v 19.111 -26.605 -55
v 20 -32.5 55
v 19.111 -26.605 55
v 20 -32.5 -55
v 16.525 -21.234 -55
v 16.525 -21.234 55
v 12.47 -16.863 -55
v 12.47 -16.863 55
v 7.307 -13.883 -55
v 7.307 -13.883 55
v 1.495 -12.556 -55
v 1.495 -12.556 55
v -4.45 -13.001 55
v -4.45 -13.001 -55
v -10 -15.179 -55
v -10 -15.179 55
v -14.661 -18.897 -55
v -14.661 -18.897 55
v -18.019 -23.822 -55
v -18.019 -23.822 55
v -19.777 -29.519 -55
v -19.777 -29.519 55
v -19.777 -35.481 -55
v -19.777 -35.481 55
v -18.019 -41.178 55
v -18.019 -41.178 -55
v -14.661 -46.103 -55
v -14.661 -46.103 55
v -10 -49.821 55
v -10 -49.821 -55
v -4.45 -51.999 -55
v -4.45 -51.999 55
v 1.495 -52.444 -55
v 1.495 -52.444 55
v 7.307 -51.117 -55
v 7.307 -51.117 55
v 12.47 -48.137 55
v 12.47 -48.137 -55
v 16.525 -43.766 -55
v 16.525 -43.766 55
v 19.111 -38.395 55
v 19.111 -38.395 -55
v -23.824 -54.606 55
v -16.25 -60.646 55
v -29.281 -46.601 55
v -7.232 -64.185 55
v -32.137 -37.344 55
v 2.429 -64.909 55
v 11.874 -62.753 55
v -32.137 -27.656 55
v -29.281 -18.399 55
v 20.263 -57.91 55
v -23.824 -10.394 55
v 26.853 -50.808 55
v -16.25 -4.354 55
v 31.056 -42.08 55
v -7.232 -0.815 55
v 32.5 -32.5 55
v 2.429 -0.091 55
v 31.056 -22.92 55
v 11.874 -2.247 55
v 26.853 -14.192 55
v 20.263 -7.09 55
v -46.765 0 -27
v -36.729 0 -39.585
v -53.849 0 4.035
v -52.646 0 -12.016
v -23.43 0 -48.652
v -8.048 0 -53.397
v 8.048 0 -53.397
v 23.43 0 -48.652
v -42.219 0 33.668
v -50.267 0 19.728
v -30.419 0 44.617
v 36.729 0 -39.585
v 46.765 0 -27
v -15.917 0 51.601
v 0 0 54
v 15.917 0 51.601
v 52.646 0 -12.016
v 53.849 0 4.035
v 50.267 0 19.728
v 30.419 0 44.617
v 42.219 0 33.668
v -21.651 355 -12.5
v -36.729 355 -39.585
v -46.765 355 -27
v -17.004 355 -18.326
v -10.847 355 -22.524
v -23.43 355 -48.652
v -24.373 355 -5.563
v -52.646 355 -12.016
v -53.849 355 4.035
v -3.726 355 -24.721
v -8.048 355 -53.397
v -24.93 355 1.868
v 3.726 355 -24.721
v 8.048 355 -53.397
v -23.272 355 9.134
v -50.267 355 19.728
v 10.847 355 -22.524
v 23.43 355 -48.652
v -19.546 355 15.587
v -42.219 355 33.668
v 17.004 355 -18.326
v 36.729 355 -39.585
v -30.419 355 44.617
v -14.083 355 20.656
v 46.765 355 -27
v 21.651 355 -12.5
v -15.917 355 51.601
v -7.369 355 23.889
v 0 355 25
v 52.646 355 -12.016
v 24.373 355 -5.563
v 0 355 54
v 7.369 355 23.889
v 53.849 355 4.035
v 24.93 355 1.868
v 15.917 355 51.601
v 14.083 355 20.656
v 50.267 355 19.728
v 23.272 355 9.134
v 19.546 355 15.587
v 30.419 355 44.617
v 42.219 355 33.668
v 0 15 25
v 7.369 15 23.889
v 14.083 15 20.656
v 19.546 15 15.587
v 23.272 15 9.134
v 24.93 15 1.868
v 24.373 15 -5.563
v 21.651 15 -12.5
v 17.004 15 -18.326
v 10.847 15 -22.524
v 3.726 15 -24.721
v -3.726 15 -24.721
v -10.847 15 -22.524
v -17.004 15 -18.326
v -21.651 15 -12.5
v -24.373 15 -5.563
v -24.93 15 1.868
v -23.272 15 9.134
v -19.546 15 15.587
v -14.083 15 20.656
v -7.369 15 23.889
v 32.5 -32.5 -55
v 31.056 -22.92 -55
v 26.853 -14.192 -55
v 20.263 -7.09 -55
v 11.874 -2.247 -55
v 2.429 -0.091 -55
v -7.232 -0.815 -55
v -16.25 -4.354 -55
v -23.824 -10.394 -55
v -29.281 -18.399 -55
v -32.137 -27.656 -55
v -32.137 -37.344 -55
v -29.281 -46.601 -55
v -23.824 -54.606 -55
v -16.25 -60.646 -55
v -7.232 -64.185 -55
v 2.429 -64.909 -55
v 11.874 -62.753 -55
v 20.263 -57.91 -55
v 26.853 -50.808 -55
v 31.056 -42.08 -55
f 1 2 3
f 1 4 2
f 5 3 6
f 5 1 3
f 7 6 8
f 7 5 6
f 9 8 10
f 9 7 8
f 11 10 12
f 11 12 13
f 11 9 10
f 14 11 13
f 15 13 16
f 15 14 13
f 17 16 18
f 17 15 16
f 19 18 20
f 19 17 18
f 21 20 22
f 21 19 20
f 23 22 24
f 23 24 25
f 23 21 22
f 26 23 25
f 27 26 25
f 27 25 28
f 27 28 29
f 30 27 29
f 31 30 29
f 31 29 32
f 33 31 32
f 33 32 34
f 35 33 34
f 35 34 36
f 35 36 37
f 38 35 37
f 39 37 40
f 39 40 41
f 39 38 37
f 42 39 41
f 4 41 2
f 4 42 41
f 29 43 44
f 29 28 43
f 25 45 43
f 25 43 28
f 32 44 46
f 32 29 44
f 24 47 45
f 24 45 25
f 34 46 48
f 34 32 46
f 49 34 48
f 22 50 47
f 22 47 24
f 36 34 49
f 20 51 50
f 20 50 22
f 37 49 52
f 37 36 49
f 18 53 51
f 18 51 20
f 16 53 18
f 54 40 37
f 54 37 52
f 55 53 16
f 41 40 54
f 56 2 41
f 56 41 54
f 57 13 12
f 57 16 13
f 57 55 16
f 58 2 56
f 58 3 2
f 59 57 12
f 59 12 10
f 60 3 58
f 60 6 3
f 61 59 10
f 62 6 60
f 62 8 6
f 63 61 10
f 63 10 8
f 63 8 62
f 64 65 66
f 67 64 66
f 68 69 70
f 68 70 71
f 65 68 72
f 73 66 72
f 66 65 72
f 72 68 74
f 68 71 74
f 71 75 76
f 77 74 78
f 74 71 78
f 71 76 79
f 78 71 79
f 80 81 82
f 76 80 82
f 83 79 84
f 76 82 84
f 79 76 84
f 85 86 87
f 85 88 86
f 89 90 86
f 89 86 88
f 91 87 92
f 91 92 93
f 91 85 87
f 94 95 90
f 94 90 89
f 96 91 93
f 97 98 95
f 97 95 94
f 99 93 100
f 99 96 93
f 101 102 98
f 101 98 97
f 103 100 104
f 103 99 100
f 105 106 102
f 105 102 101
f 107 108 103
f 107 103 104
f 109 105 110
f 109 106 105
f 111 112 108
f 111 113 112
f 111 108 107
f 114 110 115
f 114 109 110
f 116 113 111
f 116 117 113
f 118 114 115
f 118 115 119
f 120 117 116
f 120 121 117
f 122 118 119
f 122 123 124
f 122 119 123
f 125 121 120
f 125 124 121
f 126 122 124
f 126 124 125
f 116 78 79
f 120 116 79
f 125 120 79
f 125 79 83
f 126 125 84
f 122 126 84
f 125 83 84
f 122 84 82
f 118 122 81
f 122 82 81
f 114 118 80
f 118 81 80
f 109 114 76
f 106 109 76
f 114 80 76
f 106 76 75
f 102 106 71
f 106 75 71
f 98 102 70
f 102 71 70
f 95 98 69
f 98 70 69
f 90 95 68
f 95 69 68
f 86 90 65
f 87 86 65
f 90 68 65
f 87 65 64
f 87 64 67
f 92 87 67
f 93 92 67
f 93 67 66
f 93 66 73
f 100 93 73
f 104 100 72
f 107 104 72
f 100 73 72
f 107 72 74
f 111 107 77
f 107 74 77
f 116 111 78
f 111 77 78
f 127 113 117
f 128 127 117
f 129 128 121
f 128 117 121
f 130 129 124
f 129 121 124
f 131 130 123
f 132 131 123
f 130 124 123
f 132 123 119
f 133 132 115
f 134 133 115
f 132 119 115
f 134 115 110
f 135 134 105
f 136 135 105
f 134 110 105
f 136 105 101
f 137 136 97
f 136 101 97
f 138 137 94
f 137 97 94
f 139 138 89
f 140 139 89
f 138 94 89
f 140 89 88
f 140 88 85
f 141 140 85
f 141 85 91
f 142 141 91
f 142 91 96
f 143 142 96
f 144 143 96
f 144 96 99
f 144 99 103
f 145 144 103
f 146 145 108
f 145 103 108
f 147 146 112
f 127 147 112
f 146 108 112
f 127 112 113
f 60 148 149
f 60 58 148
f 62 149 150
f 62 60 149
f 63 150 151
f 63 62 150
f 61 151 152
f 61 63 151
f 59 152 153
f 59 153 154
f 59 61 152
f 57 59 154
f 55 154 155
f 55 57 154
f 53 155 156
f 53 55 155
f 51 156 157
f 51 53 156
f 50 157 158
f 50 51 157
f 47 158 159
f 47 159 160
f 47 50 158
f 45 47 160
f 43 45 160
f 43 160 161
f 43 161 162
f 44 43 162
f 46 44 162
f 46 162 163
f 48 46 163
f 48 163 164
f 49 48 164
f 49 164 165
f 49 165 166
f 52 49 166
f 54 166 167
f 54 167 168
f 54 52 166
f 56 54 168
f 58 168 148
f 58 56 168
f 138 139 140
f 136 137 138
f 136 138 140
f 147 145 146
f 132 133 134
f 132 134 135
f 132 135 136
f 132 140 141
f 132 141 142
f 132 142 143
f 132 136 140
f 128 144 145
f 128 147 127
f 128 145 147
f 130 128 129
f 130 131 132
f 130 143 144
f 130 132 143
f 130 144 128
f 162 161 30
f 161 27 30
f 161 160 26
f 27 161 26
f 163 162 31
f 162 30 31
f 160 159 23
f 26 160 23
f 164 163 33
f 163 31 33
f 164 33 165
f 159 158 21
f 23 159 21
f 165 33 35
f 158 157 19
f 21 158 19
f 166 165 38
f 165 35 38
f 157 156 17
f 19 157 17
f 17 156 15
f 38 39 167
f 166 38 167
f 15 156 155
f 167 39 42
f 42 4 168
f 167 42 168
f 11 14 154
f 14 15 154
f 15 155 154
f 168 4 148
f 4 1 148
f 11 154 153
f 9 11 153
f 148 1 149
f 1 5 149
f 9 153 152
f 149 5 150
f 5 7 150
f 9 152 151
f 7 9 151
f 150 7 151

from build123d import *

# Parameters (mm, degrees)
SKETCH_1_R          = 54
EXTRUDE_1_DEPTH     = 355
SKETCH_2_R          = 25
CUT_EXTRUDE_1_DEPTH = 340
SKETCH_3_R          = 32.5
SKETCH_3_R_2        = 20
EXTRUDE_2_DEPTH     = 55


with BuildPart() as part:
    # 草图1 → 凸台-拉伸1 (new body)
    with BuildSketch(Plane(origin=(0, 0, 0), x_dir=(1, 0, 0), z_dir=(0, 1, 0))):
        with Locations(Location((0, 0, 0), (0, 0, 270))):
            Circle(SKETCH_1_R)
    extrude(amount=EXTRUDE_1_DEPTH)

    # 草图2 → 切除-拉伸1 (cut)
    with BuildSketch(Plane(origin=(0, 355, 0), x_dir=(1, 0, 0), z_dir=(0, 1, 0))):
        with Locations(Location((0, 0, 0), (0, 0, 270))):
            Circle(SKETCH_2_R)
    extrude(amount=-CUT_EXTRUDE_1_DEPTH, mode=Mode.SUBTRACT)


with BuildPart() as body_2:
    # 草图3 → 凸台-拉伸2 (new, symmetric)
    with BuildSketch(Plane.XY):
        with Locations((0, -32.5)):
            Circle(SKETCH_3_R)
        with Locations((0, -32.5)):
            Circle(SKETCH_3_R_2, mode=Mode.SUBTRACT)
    extrude(amount=EXTRUDE_2_DEPTH, both=True)


solid = Compound([part.part, body_2.part])
